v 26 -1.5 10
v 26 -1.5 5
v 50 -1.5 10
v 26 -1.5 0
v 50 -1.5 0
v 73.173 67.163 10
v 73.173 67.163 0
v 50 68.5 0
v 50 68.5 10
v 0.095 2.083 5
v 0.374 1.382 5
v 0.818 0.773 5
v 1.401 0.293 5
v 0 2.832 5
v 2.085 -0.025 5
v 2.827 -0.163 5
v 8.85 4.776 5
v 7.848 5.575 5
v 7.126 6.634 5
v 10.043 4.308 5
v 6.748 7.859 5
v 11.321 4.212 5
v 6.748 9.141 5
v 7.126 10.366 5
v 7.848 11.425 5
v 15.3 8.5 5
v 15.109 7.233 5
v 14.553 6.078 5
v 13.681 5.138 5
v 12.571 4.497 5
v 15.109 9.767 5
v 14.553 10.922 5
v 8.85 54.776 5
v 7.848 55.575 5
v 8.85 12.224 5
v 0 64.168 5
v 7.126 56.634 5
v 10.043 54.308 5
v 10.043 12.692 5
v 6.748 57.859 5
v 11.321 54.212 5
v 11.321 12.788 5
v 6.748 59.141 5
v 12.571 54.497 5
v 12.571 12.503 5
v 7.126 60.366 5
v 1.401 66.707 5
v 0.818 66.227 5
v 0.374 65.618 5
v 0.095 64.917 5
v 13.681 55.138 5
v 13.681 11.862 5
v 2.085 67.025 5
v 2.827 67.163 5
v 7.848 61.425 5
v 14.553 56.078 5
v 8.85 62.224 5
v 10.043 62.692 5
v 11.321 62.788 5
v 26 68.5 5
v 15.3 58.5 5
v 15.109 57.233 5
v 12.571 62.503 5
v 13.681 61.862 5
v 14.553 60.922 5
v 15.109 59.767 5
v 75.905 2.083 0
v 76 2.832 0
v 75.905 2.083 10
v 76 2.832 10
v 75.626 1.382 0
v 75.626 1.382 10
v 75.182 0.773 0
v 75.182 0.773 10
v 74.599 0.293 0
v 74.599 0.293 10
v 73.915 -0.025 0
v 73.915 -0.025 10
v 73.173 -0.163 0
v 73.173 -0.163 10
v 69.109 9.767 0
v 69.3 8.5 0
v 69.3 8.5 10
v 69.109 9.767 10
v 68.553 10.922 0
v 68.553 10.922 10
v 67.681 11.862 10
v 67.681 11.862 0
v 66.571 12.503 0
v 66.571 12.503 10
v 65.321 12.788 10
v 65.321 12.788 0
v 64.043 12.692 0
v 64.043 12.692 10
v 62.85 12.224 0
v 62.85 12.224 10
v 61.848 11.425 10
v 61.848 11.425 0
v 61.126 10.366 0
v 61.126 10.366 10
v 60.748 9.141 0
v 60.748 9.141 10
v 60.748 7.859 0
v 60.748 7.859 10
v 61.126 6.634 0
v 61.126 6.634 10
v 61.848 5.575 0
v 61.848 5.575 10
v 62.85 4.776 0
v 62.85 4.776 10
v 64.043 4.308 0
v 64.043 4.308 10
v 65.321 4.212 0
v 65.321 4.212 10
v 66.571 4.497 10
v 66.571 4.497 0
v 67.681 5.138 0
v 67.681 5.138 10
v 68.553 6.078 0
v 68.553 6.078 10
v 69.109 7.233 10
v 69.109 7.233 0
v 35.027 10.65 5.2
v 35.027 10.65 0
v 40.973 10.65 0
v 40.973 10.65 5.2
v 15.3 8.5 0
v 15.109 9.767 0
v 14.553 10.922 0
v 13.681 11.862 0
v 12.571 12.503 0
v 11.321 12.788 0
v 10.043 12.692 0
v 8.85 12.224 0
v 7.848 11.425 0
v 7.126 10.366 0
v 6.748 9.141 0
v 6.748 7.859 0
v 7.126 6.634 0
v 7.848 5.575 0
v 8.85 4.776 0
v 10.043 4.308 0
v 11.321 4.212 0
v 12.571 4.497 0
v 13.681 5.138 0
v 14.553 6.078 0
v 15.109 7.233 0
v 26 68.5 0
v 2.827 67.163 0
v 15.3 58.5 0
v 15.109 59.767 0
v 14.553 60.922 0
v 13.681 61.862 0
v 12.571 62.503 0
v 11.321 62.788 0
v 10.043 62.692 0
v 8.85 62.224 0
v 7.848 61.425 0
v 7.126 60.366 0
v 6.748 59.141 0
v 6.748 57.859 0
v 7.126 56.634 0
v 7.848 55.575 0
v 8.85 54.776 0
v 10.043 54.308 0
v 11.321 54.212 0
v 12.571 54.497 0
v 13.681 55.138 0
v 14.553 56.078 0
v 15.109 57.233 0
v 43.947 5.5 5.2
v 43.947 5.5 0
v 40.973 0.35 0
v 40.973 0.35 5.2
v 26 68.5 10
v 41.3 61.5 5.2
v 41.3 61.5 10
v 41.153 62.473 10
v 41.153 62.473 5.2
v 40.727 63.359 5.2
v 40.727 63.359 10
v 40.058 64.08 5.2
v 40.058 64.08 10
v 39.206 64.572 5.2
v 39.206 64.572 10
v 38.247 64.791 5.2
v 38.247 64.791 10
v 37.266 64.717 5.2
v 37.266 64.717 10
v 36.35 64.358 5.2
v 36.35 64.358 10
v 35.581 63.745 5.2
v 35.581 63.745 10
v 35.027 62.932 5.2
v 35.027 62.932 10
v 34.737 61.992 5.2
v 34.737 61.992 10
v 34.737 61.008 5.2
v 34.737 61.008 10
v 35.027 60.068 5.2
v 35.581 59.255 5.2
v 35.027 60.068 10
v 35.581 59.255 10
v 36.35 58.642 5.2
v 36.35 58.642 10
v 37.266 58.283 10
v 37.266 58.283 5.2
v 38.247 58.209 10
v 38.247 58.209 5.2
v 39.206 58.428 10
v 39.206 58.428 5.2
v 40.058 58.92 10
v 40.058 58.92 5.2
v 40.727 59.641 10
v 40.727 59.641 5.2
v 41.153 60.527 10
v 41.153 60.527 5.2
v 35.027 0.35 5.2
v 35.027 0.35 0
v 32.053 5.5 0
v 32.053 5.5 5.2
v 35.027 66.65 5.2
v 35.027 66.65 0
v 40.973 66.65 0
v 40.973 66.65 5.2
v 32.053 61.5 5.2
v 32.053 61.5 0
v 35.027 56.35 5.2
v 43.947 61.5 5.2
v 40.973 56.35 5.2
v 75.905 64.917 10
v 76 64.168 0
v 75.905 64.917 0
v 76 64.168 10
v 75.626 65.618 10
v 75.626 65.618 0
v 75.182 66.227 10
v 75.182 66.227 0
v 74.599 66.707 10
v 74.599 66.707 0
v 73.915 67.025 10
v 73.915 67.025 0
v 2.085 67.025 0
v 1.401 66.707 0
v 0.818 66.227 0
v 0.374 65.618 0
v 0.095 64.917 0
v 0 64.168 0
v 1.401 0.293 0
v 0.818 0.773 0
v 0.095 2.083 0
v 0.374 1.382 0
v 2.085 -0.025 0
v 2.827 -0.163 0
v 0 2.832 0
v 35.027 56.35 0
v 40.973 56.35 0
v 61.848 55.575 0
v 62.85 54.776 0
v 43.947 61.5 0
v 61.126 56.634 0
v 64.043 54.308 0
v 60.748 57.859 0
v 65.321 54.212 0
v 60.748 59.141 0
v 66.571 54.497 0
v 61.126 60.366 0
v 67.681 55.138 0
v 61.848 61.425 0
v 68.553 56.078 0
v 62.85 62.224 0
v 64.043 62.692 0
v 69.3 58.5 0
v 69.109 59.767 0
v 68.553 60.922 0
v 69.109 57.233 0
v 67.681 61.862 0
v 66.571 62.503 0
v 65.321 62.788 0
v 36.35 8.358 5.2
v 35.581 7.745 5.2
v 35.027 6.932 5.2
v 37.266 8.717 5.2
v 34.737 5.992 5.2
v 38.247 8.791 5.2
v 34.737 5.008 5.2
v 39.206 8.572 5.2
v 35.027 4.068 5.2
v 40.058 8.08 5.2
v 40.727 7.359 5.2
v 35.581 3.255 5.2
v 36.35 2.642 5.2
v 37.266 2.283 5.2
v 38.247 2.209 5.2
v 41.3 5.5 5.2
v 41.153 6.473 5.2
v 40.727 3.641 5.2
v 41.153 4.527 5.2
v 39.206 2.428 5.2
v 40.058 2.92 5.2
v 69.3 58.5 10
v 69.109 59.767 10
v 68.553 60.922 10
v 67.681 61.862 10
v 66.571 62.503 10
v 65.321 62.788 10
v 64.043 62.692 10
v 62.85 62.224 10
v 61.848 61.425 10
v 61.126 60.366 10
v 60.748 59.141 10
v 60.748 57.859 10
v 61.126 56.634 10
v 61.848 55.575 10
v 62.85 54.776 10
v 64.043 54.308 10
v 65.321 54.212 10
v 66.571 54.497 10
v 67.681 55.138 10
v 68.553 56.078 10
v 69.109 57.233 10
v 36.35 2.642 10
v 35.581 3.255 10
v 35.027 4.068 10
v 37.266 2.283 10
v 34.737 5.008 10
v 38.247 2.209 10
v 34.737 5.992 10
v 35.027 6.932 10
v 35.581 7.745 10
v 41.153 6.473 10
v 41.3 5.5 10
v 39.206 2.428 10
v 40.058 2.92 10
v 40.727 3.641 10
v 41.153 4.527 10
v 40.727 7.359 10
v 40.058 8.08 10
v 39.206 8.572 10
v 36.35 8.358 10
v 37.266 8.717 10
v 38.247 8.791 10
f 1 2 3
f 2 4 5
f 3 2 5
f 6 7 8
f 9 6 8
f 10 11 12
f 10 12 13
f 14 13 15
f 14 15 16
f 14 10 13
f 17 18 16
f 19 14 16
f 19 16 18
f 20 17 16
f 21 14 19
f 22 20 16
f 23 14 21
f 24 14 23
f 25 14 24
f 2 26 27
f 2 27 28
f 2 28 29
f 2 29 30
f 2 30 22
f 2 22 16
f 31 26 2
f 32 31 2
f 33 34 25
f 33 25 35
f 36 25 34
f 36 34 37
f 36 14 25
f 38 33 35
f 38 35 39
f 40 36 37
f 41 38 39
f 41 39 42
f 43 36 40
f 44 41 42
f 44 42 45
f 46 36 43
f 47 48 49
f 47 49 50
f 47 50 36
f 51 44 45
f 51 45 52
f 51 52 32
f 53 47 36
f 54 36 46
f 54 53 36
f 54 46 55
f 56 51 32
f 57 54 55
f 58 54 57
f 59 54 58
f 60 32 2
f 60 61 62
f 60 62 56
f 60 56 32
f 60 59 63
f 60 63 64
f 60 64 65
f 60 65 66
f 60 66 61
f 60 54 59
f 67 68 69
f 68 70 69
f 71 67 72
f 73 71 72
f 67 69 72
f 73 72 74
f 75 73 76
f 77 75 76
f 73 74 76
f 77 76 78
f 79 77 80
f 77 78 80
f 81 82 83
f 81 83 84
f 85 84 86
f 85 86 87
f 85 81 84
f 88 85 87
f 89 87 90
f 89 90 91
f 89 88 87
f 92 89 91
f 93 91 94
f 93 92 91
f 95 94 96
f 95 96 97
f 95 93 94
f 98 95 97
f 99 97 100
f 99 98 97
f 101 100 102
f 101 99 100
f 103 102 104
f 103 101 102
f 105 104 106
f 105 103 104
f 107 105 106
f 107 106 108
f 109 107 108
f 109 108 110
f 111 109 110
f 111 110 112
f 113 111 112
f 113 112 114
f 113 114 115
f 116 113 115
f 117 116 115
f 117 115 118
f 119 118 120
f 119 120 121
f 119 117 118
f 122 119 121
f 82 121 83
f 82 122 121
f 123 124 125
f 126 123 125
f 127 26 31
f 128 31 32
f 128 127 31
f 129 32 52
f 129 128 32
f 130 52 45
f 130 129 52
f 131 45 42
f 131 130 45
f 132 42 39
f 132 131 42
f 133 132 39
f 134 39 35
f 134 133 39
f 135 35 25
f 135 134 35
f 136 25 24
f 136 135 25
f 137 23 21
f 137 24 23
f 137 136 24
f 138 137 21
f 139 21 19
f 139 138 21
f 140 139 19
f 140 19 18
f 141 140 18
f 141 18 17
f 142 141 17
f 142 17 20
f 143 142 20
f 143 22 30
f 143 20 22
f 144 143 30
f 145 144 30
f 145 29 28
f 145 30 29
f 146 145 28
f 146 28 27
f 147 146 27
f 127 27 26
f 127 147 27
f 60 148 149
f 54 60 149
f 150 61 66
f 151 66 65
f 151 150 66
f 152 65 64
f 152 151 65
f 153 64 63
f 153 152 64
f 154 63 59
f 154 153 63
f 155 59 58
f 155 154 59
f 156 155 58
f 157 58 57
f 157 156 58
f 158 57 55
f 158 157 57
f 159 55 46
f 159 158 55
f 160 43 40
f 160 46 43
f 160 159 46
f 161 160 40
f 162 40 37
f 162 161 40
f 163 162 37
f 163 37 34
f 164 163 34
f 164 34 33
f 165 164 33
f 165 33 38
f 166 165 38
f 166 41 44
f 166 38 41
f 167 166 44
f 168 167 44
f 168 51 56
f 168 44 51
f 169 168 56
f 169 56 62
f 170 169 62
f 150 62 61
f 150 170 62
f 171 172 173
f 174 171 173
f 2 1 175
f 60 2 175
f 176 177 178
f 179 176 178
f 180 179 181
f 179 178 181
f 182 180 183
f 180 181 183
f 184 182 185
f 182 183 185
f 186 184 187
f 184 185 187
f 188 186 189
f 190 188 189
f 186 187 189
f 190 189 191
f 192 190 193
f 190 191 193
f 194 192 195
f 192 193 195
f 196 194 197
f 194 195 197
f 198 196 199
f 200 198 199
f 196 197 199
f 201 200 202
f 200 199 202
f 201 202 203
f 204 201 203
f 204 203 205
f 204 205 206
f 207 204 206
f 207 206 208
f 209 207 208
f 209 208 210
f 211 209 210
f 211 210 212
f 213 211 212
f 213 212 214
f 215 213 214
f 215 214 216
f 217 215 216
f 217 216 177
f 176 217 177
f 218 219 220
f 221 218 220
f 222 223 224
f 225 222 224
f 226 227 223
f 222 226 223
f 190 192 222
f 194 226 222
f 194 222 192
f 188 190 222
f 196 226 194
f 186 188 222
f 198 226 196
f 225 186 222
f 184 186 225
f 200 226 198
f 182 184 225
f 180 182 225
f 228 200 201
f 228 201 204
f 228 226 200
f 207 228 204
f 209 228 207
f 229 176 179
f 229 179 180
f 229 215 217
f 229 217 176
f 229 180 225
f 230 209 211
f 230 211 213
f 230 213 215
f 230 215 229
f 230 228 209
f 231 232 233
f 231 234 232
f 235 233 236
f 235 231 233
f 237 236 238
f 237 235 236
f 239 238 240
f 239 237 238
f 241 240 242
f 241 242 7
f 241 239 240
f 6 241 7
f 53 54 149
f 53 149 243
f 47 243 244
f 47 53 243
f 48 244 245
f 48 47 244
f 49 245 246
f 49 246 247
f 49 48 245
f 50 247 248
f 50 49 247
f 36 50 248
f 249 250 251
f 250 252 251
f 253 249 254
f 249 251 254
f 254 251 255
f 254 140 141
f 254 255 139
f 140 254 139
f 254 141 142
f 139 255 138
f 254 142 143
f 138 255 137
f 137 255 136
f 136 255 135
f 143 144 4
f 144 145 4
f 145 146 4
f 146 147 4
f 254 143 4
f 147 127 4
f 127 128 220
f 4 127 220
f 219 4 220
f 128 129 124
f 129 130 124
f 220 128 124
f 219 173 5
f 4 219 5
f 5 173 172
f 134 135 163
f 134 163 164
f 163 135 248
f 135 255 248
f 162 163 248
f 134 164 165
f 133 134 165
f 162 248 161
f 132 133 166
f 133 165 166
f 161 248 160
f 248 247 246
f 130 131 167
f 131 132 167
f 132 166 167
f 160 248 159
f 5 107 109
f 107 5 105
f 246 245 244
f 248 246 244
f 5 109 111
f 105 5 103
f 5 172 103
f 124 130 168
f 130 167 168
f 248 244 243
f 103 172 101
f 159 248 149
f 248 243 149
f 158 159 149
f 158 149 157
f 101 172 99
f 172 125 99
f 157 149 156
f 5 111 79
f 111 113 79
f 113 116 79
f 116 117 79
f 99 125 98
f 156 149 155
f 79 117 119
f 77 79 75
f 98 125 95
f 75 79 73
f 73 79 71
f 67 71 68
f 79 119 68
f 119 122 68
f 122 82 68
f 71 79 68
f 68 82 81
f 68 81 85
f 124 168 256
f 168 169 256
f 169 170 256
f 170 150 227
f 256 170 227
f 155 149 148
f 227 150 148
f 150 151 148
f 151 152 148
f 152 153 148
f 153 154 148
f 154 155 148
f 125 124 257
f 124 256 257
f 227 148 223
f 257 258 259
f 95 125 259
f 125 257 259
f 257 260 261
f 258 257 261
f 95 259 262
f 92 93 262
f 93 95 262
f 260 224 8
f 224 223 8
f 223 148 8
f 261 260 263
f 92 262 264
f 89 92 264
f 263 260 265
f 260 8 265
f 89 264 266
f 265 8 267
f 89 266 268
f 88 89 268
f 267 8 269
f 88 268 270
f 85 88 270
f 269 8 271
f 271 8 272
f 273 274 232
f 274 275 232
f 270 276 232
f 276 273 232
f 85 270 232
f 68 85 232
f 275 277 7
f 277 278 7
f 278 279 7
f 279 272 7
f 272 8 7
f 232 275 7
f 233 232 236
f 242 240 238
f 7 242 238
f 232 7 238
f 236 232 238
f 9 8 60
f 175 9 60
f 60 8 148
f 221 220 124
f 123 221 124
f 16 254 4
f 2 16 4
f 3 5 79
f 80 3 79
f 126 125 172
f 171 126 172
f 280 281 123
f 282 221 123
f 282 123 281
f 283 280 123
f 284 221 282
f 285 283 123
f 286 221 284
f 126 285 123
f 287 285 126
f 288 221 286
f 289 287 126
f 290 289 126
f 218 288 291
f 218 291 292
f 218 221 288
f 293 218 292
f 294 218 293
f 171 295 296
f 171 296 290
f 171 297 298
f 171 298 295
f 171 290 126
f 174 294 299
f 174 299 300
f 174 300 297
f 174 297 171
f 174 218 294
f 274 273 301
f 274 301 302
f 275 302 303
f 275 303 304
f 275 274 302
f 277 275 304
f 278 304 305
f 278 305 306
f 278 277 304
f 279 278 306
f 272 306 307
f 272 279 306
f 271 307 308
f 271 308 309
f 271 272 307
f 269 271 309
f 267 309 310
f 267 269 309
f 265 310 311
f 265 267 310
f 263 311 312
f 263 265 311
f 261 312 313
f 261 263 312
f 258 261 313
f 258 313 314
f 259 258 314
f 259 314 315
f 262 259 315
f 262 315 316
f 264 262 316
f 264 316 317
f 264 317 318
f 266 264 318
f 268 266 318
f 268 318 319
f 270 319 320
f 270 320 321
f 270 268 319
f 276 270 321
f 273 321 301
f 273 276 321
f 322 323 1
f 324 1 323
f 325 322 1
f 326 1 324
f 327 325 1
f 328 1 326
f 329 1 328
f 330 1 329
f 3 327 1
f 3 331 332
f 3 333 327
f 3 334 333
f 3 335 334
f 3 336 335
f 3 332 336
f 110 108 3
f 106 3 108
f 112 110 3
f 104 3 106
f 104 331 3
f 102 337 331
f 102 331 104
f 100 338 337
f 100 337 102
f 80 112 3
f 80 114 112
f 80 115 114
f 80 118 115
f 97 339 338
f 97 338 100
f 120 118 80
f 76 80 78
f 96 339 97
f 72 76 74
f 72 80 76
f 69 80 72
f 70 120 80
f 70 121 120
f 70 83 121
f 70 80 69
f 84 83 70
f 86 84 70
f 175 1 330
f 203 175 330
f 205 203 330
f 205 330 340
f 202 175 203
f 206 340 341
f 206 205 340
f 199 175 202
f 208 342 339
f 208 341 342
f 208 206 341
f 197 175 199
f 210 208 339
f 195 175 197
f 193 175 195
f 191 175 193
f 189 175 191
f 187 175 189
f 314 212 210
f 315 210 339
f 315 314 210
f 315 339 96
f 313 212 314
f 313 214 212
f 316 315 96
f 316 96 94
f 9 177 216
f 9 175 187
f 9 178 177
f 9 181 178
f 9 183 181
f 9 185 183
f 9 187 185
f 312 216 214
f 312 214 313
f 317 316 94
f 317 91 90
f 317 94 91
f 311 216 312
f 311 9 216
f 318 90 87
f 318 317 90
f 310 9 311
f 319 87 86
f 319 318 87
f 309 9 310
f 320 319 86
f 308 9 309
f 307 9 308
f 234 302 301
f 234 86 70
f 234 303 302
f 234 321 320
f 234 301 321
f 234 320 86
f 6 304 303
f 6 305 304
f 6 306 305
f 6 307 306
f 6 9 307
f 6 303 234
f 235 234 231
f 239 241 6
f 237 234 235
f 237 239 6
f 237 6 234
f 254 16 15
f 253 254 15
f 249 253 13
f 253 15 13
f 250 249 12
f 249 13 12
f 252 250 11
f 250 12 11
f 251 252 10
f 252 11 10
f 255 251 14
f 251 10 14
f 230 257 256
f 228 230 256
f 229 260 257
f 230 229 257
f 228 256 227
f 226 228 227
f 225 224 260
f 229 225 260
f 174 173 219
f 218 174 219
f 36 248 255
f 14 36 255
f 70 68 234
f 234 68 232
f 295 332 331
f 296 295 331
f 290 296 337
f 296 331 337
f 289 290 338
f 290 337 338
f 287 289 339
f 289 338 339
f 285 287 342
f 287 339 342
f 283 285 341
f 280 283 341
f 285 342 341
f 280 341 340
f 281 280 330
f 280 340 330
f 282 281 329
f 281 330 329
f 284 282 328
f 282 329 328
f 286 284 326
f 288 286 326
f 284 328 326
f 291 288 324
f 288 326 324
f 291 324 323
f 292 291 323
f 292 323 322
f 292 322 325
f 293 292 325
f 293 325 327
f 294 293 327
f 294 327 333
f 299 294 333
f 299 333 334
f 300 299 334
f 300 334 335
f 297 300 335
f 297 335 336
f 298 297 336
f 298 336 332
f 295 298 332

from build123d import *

# Parameters (mm, degrees)
SKETCH_R        = 4.3
PAD_DEPTH       = 10
SKETCH001_R     = 3.3
POCKET_DEPTH    = 10.001
POCKET001_DEPTH = 5.2
FILLET_R        = 3
SKETCH003_W     = 26
SKETCH003_H     = 70
POCKET002_DEPTH = 5


with BuildPart() as part:
    # Sketch → Pad (new body)
    with BuildSketch(Plane.XY):
        Polygon((76, 0), (76, 67), (50, 68.5), (26, 68.5), (0, 67), (0, 0), (26, -1.5), (50, -1.5), align=None)
        with Locations((11, 58.5)):
            Circle(SKETCH_R, mode=Mode.SUBTRACT)
        with Locations((65, 58.5)):
            Circle(SKETCH_R, mode=Mode.SUBTRACT)
        with Locations((65, 8.5)):
            Circle(SKETCH_R, mode=Mode.SUBTRACT)
        with Locations((11, 8.5)):
            Circle(SKETCH_R, mode=Mode.SUBTRACT)
    extrude(amount=PAD_DEPTH)

    # Sketch001 (on Face14 of Pad) → Pocket (cut, through all)
    with BuildSketch(Plane.XY.offset(10)):
        with Locations((38, 61.5)):
            Circle(SKETCH001_R)
        with Locations((38, 5.5)):
            Circle(SKETCH001_R)
    extrude(amount=-POCKET_DEPTH, mode=Mode.SUBTRACT)

    # Sketch002 (on Face4 of Pocket) → Pocket001 (cut)
    with BuildSketch(Plane(origin=(0, 0, 0), x_dir=(1, 0, 0), z_dir=(0, 0, -1))):
        Polygon((40.973354, -10.65), (43.946708, -5.5), (40.973354, -0.35), (35.026646, -0.35), (32.053292, -5.5), (35.026646, -10.65), align=None)
        Polygon((43.946708, -61.5), (40.973354, -56.35), (35.026646, -56.35), (32.053292, -61.5), (35.026646, -66.65), (40.973354, -66.65), align=None)
    extrude(amount=-POCKET001_DEPTH, mode=Mode.SUBTRACT)

    # Fillet
    fillet_edges = [part.edges().sort_by_distance(p)[0] for p in [
        (0, 67, 5),
        (0, 0, 5),
        (76, 0, 5),
        (76, 67, 5),
    ]]
    fillet(fillet_edges, radius=FILLET_R)

    # Sketch003 (on Face5 of Fillet) → Pocket002 (cut)
    with BuildSketch(Plane.XY.offset(10)):
        with Locations((13, 33.5)):
            Rectangle(SKETCH003_W, SKETCH003_H)
    extrude(amount=-POCKET002_DEPTH, mode=Mode.SUBTRACT)


solid = part.part
